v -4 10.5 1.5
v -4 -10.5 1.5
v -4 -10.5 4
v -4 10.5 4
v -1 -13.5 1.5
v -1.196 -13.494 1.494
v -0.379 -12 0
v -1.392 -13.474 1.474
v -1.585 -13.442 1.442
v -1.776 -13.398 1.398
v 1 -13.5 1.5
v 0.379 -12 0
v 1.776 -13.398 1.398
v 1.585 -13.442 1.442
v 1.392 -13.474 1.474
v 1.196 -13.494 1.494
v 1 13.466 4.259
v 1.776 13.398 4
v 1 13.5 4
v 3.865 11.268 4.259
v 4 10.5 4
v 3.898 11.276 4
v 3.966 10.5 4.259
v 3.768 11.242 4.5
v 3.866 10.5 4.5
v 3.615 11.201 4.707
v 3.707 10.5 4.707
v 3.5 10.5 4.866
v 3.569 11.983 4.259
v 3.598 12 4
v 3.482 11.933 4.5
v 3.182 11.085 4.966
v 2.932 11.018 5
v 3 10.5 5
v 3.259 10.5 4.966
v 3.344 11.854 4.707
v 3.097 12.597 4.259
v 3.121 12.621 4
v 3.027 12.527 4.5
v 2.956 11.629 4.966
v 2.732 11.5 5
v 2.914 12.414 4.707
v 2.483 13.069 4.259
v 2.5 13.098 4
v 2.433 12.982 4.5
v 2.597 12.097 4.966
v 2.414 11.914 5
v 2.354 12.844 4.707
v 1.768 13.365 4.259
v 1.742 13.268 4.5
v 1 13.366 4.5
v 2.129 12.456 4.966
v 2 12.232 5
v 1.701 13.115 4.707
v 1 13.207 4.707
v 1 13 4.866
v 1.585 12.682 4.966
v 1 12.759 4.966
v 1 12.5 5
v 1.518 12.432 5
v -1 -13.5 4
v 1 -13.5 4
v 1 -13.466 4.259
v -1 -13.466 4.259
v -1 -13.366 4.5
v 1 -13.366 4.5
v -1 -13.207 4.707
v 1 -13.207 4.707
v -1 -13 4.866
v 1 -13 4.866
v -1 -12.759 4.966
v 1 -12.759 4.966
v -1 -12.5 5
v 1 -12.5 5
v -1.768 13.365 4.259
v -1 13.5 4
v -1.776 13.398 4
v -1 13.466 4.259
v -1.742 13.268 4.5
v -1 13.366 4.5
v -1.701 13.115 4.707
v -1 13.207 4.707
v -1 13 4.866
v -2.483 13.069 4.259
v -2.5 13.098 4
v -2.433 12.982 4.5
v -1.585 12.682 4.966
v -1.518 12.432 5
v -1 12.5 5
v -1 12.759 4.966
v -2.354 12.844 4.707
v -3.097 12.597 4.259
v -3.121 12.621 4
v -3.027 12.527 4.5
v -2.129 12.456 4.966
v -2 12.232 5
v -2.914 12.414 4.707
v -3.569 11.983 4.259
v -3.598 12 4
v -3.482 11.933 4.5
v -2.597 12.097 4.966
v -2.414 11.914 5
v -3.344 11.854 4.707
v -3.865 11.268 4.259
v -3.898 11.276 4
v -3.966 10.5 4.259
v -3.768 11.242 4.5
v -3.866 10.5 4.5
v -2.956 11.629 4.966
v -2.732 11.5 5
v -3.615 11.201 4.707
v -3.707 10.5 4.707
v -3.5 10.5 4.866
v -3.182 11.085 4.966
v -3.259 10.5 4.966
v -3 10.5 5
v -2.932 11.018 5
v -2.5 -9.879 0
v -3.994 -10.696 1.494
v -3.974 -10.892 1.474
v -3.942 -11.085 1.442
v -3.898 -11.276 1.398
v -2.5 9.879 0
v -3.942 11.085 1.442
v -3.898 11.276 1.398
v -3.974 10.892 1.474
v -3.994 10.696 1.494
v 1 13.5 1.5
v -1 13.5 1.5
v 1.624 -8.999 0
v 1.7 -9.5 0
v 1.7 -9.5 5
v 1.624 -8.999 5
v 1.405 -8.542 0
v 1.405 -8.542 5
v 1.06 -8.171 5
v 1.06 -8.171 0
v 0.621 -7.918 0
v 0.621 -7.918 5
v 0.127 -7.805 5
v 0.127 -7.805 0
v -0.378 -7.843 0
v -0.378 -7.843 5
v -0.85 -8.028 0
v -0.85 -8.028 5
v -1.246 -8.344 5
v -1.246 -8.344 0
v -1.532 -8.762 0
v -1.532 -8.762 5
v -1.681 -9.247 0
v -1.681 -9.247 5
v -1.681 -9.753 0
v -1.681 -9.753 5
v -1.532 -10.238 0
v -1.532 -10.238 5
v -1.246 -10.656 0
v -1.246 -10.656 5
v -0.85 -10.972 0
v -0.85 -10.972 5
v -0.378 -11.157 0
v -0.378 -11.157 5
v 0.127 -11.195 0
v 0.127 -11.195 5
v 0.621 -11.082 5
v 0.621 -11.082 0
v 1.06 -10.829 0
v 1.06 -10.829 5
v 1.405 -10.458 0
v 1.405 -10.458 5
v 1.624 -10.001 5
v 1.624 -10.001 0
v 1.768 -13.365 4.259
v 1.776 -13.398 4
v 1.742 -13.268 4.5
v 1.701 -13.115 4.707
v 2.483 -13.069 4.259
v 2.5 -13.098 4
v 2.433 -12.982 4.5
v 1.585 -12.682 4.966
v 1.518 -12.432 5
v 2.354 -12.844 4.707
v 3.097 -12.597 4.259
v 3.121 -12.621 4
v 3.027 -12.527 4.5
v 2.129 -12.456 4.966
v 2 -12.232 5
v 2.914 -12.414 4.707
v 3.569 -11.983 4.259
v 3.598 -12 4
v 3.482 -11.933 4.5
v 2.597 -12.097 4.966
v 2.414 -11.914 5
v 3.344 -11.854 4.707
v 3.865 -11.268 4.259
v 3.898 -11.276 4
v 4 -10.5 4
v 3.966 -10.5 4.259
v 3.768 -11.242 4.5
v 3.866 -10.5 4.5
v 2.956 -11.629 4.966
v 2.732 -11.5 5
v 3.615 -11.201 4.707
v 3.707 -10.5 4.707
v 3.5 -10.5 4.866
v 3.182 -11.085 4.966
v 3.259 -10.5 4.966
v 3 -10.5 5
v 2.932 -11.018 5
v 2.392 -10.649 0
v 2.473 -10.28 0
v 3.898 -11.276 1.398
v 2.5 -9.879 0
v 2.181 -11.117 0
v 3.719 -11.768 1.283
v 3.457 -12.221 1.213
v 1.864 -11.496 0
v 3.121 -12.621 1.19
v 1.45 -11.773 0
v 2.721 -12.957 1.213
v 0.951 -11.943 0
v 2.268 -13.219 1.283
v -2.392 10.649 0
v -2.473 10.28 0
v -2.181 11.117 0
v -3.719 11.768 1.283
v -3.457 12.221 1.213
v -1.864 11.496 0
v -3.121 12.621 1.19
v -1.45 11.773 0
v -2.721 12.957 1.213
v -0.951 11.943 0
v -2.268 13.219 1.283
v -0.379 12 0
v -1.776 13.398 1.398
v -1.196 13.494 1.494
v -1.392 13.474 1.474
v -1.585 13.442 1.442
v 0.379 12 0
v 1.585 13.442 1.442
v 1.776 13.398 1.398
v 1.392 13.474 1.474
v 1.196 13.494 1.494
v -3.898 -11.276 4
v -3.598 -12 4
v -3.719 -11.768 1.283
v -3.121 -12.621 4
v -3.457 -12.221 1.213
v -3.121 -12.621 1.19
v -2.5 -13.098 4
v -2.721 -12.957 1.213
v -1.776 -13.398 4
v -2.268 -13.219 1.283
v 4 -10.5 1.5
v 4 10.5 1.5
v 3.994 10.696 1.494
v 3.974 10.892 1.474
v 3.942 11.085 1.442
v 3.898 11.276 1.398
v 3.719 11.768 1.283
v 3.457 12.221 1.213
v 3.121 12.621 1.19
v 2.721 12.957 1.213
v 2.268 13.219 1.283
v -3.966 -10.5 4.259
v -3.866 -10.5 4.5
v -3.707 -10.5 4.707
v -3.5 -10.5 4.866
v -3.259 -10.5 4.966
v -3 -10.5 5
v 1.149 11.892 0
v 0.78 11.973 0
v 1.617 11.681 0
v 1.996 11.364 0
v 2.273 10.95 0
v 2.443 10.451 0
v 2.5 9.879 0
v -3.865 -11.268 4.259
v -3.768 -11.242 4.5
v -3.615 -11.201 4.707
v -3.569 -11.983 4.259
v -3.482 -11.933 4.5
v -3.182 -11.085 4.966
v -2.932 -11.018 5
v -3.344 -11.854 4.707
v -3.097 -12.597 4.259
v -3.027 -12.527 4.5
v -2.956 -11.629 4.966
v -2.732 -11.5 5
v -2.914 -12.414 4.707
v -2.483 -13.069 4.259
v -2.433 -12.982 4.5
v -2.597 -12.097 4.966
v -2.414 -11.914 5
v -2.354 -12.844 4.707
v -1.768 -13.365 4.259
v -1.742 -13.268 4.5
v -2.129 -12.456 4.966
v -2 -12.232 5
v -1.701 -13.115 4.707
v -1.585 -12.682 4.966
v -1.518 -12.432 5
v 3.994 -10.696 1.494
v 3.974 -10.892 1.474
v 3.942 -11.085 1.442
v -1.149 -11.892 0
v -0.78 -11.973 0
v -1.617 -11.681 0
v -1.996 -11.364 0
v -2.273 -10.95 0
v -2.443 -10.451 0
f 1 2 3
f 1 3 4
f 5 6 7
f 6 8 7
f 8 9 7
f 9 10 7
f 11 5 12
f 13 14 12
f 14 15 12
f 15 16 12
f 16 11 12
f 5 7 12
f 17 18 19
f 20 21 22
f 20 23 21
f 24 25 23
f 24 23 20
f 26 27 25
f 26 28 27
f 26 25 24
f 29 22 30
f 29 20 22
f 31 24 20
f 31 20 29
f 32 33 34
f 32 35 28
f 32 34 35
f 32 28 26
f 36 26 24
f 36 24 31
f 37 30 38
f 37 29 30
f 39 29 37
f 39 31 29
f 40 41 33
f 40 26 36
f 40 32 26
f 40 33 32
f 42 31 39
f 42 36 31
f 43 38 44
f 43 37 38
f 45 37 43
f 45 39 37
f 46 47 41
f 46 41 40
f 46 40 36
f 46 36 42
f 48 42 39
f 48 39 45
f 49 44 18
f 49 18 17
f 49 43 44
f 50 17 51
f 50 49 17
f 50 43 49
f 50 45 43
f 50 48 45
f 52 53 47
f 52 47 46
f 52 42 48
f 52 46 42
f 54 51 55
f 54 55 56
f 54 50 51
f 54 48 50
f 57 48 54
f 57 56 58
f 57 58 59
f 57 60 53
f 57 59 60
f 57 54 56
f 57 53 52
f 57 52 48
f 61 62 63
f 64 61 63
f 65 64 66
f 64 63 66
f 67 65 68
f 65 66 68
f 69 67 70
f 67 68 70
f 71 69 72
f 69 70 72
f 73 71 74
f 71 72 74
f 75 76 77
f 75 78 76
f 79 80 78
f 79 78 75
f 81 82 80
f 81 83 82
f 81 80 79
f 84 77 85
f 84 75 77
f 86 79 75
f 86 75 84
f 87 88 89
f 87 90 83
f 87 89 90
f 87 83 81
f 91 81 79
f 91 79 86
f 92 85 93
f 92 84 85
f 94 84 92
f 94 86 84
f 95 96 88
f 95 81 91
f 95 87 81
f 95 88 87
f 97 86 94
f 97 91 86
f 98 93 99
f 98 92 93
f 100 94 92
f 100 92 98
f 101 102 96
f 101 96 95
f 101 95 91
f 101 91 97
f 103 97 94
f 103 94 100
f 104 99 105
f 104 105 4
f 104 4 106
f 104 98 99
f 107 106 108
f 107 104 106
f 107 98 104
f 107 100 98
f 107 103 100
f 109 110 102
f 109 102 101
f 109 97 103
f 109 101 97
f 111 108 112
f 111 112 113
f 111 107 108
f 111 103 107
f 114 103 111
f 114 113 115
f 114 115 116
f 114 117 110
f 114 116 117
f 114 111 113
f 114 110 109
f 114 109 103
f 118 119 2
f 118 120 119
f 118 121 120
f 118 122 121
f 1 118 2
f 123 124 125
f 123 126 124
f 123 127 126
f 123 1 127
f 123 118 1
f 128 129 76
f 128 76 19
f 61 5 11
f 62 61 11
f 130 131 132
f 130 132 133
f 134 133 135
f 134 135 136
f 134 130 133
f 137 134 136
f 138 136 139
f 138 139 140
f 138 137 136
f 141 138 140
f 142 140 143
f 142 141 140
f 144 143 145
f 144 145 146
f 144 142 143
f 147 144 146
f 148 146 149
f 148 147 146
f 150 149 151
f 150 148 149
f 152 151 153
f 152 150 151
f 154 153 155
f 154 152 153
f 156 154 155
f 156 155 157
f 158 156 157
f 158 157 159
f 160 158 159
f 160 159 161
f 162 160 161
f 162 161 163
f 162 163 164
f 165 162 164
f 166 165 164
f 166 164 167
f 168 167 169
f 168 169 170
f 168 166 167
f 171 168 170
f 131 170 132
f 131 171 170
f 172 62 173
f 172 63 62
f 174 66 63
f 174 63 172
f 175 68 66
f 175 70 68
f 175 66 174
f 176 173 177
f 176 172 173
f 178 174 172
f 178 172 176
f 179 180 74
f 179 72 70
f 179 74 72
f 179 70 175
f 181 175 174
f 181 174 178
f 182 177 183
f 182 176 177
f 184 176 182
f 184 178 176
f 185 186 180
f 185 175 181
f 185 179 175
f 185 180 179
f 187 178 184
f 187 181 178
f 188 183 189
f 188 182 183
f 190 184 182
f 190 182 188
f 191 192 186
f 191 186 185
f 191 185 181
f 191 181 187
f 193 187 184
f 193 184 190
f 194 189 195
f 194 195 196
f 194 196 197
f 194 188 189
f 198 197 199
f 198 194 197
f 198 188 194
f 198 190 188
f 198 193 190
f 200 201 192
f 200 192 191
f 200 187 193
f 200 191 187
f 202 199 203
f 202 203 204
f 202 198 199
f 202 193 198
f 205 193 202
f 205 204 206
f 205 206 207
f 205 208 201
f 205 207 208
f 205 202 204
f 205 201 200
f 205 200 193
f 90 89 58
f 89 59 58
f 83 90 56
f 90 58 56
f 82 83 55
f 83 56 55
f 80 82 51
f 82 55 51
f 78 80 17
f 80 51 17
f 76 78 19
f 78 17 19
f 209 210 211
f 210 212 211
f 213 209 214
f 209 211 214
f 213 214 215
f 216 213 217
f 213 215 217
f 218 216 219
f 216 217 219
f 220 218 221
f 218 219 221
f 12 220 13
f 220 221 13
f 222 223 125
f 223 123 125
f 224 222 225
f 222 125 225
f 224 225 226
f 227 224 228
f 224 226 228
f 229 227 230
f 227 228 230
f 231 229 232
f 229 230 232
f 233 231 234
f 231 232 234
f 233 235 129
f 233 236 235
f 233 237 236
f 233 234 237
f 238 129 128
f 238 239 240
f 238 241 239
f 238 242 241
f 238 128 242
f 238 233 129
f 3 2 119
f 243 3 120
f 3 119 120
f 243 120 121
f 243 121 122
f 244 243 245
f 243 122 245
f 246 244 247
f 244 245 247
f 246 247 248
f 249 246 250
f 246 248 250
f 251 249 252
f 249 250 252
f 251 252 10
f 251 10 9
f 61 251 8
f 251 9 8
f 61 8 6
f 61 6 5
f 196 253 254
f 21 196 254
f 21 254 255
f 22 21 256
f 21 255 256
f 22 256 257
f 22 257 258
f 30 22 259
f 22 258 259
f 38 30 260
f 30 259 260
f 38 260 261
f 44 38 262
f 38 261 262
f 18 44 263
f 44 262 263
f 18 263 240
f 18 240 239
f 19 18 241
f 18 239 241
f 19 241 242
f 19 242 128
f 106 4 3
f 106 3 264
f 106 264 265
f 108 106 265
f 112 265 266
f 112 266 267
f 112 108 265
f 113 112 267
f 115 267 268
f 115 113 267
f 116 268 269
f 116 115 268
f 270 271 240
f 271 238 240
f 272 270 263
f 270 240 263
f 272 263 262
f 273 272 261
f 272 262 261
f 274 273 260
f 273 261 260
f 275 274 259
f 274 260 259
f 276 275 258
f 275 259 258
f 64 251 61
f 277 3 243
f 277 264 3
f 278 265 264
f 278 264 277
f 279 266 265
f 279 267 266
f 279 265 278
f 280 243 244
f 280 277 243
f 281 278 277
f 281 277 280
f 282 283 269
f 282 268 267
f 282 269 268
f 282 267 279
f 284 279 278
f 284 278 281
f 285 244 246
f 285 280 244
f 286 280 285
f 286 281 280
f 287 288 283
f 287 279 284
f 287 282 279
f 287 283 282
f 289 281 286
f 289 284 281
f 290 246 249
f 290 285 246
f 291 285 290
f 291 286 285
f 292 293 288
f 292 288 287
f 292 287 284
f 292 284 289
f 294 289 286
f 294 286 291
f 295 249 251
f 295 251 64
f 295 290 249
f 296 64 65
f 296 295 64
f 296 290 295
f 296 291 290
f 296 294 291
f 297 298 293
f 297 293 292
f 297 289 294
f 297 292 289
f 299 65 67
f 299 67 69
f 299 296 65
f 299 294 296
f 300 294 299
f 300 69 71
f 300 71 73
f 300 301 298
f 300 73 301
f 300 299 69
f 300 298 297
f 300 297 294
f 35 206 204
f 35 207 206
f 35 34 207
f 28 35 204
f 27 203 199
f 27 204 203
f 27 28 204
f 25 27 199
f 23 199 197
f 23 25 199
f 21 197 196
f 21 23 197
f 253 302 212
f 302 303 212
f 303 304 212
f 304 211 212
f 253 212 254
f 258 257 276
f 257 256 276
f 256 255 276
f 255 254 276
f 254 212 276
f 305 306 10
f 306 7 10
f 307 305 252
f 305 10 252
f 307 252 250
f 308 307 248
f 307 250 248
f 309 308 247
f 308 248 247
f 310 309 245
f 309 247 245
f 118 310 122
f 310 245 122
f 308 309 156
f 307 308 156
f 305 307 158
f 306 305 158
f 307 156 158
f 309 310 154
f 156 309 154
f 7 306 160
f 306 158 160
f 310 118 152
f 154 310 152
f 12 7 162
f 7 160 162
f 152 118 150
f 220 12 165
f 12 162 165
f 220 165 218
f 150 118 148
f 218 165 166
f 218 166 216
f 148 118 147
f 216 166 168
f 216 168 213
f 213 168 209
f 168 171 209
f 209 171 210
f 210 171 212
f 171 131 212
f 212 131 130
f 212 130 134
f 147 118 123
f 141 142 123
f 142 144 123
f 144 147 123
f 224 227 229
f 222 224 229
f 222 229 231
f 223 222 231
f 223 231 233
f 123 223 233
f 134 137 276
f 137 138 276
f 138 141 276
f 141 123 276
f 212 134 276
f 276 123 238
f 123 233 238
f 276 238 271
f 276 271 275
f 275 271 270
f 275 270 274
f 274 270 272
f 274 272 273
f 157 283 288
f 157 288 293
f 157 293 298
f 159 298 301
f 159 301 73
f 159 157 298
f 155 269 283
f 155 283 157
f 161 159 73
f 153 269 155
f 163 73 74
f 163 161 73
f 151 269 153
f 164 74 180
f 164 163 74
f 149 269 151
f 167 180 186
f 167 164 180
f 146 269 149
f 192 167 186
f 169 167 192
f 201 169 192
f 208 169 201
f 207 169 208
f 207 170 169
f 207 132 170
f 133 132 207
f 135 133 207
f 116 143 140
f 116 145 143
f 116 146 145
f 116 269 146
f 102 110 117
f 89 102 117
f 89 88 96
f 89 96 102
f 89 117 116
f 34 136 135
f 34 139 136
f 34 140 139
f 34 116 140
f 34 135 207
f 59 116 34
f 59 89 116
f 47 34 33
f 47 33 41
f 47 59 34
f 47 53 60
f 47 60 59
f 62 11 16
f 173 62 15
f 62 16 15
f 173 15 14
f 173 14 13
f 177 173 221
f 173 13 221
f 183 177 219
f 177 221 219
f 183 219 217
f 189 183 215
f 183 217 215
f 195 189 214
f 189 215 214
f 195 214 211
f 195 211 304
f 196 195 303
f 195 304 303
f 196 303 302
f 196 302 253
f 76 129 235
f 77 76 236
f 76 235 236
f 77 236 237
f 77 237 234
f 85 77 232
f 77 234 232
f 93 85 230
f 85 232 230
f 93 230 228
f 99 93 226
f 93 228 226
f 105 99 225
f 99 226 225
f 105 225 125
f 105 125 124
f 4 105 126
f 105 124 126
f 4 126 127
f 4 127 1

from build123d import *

# Parameters (mm, degrees)
SKETCH1_W           = 8
SKETCH1_H           = 27
SKETCH1_R           = 1.7
BOSS_EXTRUDE1_DEPTH = 5
CHAMFER1_SIZE       = 1.5
FILLET1_R           = 1
FILLET2_R           = 3


with BuildPart() as part:
    # Sketch1 → Boss-Extrude1 (new body)
    with BuildSketch(Plane.XY):
        Rectangle(SKETCH1_W, SKETCH1_H)
        with Locations((0, -9.5)):
            Circle(SKETCH1_R, mode=Mode.SUBTRACT)
    extrude(amount=BOSS_EXTRUDE1_DEPTH)

    # Chamfer1
    chamfer1_edges = [part.edges().sort_by_distance(p)[0] for p in [
        (0, -13.5, 0),
        (-4, 0, 0),
        (0, 13.5, 0),
        (4, 0, 0),
    ]]
    chamfer(chamfer1_edges, length=CHAMFER1_SIZE)

    # Fillet1
    fillet1_edges = [part.edges().sort_by_distance(p)[0] for p in [
        (-4, 0, 5),
        (0, -13.5, 5),
        (4, 0, 5),
        (0, 13.5, 5),
    ]]
    fillet(fillet1_edges, radius=FILLET1_R)

    # Fillet2
    # the kernel refuses this fillet: 3 mm, written as the material it takes off along each edge
    with BuildSketch(Plane(origin=(-1, 10.5, 5), x_dir=(0, 1, 0), z_dir=(1, 0, 0))) as fillet2_piece_1:
        with BuildLine():
            CenterArc((2, -1), 1, 0, 90)
            Line((3, -1), (3, 0))
            Line((3, 0), (2, 0))
        make_face()
    revolve(axis=Axis((-1, 10.5, 5), (0, 0, 1)), revolution_arc=90, mode=Mode.SUBTRACT)
    with BuildSketch(Plane(origin=(1, 10.5, 5), x_dir=(1, 0, 0), z_dir=(0, -1, 0))) as fillet2_piece_2:
        with BuildLine():
            CenterArc((2, -1), 1, 0, 90)
            Line((3, -1), (3, 0))
            Line((3, 0), (2, 0))
        make_face()
    revolve(axis=Axis((1, 10.5, 5), (0, 0, 1)), revolution_arc=90, mode=Mode.SUBTRACT)
    with BuildSketch(Plane(origin=(-1, -10.5, 5), x_dir=(-1, 0, 0), z_dir=(0, 1, 0))) as fillet2_piece_3:
        with BuildLine():
            CenterArc((2, -1), 1, 0, 90)
            Line((3, -1), (3, 0))
            Line((3, 0), (2, 0))
        make_face()
    revolve(axis=Axis((-1, -10.5, 5), (0, 0, 1)), revolution_arc=90, mode=Mode.SUBTRACT)
    with BuildSketch(Plane(origin=(1, -10.5, 5), x_dir=(0, -1, 0), z_dir=(-1, 0, 0))) as fillet2_piece_4:
        with BuildLine():
            CenterArc((2, -1), 1, 0, 90)
            Line((3, -1), (3, 0))
            Line((3, 0), (2, 0))
        make_face()
    revolve(axis=Axis((1, -10.5, 5), (0, 0, 1)), revolution_arc=90, mode=Mode.SUBTRACT)
    with BuildSketch(Plane(origin=(-6.5, 16, 4), x_dir=(0.816496580927726, 0.40824829046386274, 0.40824829046386324), z_dir=(0.5773502691896258, -0.5773502691896258, -0.5773502691896258)), Plane(origin=(-6.5, -16, 4), x_dir=(-0.4082482904638628, 0.816496580927726, 0.40824829046386335), z_dir=(0.5773502691896257, 0.5773502691896258, -0.5773502691896257))) as fillet2_piece_5:
        with BuildLine():
            CenterArc((FILLET2_R * 0.57735026919, FILLET2_R), FILLET2_R, 210, 60)
            Line((-FILLET2_R * 0.288675134595, FILLET2_R * 0.5), (0, 0))
            Line((0, 0), (FILLET2_R * 0.57735026919, 0))
        make_face()
    extrude(amount=11.258330249, mode=Mode.SUBTRACT)
    with BuildSketch(Plane(origin=(6.5, 16, 4), x_dir=(-0.8164965809277261, 0.4082482904638628, 0.4082482904638633), z_dir=(-0.5773502691896258, -0.5773502691896258, -0.5773502691896258)), Plane(origin=(6.5, -16, 4), x_dir=(0.4082482904638627, 0.8164965809277261, 0.4082482904638632), z_dir=(-0.5773502691896258, 0.5773502691896257, -0.5773502691896258))) as fillet2_piece_6:
        with BuildLine():
            CenterArc((FILLET2_R * 0.57735026919, -FILLET2_R), FILLET2_R, 90, 60)
            Line((-FILLET2_R * 0.288675134595, -FILLET2_R * 0.5), (0, 0))
            Line((0, 0), (FILLET2_R * 0.57735026919, 0))
        make_face()
    extrude(amount=11.258330249, mode=Mode.SUBTRACT)
    with BuildSketch(Plane(origin=(-4, -13.5, -6), x_dir=(0, 1, 0), z_dir=(0, 0, 1)), Plane(origin=(-4, 13.5, -6), x_dir=(1, 0, 0), z_dir=(0, 0, 1))) as fillet2_piece_7:
        with BuildLine():
            CenterArc((FILLET2_R, -FILLET2_R), FILLET2_R, 90, 90)
            Line((0, -FILLET2_R), (0, 0))
            Line((0, 0), (FILLET2_R, 0))
        make_face()
    extrude(amount=11, mode=Mode.SUBTRACT)
    with BuildSketch(Plane(origin=(4, -13.5, -6), x_dir=(0, 1, 0), z_dir=(0, 0, 1)), Plane(origin=(4, 13.5, -6), x_dir=(-1, 0, 0), z_dir=(0, 0, 1))) as fillet2_piece_8:
        with BuildLine():
            CenterArc((FILLET2_R, FILLET2_R), FILLET2_R, 180, 90)
            Line((0, FILLET2_R), (0, 0))
            Line((0, 0), (FILLET2_R, 0))
        make_face()
    extrude(amount=11, mode=Mode.SUBTRACT)


solid = part.part
